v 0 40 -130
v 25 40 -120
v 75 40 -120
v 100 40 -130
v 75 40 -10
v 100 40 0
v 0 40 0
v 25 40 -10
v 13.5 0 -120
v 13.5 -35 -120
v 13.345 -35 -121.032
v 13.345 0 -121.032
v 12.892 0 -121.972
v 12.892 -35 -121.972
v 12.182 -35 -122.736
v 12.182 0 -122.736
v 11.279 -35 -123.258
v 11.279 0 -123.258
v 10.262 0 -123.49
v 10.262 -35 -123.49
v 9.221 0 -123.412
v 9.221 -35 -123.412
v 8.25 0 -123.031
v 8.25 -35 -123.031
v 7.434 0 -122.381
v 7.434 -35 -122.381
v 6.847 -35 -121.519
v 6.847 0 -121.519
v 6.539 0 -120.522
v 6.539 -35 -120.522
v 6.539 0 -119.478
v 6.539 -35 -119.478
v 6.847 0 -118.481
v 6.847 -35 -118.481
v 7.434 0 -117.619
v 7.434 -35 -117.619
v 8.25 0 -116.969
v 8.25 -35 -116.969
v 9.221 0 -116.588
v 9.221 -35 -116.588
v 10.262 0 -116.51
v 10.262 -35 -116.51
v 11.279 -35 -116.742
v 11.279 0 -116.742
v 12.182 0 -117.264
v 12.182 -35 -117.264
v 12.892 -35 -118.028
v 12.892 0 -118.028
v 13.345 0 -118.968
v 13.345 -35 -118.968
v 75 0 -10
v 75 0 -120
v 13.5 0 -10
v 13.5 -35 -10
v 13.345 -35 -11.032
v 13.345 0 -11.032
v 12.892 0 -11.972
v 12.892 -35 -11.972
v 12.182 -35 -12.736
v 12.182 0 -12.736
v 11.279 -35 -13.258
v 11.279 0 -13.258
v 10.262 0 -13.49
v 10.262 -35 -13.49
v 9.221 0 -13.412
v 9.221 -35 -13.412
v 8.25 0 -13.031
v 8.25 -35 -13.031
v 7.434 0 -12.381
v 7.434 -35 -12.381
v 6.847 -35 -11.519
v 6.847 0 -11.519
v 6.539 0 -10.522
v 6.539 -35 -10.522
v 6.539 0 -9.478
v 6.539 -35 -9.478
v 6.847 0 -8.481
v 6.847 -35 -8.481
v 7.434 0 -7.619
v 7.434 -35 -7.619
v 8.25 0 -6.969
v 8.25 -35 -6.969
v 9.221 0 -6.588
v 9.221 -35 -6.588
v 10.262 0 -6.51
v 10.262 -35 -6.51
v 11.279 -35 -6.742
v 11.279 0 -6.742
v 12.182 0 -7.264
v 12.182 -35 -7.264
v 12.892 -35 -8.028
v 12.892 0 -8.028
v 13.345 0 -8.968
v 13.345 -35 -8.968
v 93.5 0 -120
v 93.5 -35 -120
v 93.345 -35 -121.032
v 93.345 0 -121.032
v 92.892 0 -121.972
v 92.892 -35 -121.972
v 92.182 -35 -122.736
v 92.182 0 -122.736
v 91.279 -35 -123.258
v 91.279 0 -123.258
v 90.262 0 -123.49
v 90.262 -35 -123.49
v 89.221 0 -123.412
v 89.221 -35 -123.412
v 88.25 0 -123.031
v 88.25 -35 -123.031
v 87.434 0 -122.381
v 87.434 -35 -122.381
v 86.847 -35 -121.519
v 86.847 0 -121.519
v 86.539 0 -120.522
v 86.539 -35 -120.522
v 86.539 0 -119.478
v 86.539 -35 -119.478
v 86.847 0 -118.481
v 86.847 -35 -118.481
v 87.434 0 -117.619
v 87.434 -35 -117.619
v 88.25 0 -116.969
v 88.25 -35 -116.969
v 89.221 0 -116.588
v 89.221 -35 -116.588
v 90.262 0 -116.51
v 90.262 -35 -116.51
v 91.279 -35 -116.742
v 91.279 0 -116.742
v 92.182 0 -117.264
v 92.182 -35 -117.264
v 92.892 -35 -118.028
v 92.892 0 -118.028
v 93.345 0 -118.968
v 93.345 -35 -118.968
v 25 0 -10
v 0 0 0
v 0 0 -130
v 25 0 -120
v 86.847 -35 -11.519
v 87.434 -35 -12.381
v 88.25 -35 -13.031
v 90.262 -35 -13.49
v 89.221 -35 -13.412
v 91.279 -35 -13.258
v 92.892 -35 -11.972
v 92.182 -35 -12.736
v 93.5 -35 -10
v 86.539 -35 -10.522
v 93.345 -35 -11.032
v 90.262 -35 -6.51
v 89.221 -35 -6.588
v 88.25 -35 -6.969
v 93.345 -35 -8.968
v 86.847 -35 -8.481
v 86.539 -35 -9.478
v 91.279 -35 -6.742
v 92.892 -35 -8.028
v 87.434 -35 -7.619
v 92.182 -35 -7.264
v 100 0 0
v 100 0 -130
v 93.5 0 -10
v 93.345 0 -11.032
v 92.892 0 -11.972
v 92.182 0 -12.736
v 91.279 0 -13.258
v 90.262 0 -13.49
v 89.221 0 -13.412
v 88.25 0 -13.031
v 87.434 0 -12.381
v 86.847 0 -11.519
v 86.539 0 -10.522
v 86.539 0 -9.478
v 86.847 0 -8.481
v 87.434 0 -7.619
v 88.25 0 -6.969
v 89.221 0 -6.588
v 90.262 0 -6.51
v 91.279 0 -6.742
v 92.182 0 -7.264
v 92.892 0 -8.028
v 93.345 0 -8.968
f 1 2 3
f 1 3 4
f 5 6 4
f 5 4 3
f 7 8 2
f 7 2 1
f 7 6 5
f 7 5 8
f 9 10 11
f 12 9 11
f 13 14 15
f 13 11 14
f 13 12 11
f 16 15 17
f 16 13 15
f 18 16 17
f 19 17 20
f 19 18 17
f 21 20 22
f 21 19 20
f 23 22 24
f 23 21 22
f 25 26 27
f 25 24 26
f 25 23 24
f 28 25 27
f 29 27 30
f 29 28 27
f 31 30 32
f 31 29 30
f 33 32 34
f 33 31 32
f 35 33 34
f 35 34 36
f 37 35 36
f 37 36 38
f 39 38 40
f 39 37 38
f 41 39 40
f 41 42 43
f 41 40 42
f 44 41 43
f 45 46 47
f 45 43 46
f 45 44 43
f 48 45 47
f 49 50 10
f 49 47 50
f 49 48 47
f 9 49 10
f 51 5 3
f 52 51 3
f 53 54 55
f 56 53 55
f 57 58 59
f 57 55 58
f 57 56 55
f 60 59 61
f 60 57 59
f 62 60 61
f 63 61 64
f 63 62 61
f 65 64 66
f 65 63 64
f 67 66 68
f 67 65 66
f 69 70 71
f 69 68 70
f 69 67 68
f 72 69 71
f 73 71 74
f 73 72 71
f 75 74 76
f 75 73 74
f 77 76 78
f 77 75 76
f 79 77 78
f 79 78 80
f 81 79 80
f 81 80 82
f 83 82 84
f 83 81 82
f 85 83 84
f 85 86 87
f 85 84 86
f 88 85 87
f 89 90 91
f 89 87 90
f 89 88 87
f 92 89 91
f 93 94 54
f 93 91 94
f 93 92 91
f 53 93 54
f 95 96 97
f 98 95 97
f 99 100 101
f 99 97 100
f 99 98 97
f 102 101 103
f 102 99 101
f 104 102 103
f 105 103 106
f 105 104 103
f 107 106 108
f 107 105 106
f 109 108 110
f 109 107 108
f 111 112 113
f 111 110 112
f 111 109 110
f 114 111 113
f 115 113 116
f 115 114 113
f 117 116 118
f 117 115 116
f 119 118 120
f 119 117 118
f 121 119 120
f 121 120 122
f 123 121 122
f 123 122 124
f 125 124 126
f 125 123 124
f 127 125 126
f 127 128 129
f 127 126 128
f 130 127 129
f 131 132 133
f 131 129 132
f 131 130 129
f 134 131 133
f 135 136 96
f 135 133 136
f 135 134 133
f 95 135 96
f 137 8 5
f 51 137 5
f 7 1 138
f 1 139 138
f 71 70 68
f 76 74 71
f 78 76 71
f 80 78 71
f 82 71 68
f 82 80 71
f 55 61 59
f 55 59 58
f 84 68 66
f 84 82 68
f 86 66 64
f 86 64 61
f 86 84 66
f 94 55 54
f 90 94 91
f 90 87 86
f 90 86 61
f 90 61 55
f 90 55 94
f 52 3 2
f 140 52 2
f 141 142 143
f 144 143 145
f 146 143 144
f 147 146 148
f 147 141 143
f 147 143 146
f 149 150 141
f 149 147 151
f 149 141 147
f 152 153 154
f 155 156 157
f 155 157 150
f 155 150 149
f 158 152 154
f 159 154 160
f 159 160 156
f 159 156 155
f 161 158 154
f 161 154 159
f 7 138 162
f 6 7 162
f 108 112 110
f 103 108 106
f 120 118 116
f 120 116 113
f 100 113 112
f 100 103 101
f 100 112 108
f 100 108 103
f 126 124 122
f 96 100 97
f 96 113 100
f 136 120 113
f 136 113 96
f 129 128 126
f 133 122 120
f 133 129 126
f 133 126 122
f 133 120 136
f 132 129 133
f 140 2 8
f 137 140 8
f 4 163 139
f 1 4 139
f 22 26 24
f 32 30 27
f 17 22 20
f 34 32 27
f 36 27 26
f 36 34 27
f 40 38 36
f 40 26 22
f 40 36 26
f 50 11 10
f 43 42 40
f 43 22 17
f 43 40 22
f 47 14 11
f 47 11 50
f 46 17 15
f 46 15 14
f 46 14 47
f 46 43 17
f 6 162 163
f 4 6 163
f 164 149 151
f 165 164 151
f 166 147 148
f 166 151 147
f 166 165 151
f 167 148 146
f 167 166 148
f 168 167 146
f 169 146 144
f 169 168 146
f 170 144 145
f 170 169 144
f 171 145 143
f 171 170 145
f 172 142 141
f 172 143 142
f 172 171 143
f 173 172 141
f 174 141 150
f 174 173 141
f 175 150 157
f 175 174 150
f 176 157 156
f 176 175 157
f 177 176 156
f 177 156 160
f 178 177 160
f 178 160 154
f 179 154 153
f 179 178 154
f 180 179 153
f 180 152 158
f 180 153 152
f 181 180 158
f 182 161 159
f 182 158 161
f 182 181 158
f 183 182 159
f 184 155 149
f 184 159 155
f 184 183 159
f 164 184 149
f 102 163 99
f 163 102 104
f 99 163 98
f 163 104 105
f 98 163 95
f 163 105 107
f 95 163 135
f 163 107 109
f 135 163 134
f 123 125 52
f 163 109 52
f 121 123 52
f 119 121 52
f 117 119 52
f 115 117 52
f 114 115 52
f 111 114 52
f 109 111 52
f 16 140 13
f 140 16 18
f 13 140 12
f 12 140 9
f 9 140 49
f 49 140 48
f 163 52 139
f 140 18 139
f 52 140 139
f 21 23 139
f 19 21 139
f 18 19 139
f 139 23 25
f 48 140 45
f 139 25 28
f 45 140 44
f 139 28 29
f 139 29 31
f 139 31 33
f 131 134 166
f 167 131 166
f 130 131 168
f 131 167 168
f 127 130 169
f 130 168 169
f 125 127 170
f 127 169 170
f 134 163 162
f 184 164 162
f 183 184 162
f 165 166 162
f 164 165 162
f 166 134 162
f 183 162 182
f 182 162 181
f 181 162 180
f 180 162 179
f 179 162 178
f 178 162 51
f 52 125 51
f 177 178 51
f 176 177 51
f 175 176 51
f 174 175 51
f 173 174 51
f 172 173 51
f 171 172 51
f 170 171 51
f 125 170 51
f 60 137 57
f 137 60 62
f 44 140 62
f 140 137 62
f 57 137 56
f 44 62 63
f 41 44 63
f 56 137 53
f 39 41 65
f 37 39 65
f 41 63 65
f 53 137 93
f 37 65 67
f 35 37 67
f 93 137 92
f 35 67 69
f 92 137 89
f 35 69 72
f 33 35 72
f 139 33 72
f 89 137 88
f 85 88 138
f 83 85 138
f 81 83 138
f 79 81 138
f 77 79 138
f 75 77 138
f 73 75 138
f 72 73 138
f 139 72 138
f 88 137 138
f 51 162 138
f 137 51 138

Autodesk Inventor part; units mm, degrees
ref_plane "YZ Plane" through (0, 0, 0) normal (1, 0, 0) x (0, 1, 0)
ref_plane "XZ Plane" through (0, 0, 0) normal (0, 1, 0) x (-1, 0, 0)
ref_plane "XY Plane" through (0, 0, 0) normal (0, 0, 1) x (1, 0, 0)
sketch "Sketch1" plane through (0, 0, 0) normal (0, 1, 0) x (-1, 0, 0)
  line L0 (0, 0) -> (-100, 0)
  line L1 (-100, 0) -> (-100, -130)
  line L2 (-100, -130) -> (0, -130)
  line L3 (0, -130) -> (0, 0)
  dimension "d0" = 100
  dimension "d1" = 130
extrude "Extrusion1" add sketch "Sketch1" along normal blind 40
sketch "Sketch2" plane through (0, 40, 0) normal (0, 1, 0) x (1, 0, 0)
  line L0 (25, 10) -> (75, 10)
  line L1 (75, 10) -> (75, 120)
  line L2 (75, 120) -> (25, 120)
  line L3 (25, 120) -> (25, 10)
  line L4 (100, 130) -> (0, 130) projected
  line L5 (0, 0) -> (100, 0) projected
  line L6 (0, 130) -> (0, 0) projected
  line L7 (100, 0) -> (100, 130) projected
  dimension "d4" = 10
  dimension "d5" = 10
  dimension "d6" = 25
  dimension "d7" = 25
extrude "Extrusion2" cut sketch "Sketch2" against normal blind 40 contours L3 L2 L1 L0
sketch "Sketch3" plane through (0, 0, 0) normal (0, -1, 0) x (1, 0, 0)
  circle A0 centre (90, -10) radius 3.5
  line L0 (100, 0) -> (100, -130) projected
  line L1 (0, 0) -> (100, 0) projected
  line L2 (0, 0) -> (100, 0) projected
  line L3 (50, 0) -> (50, -130)
  line L4 (100, 0) -> (100, -130) projected
  line L5 (100, -65) -> (0, -65)
  line L6 (0, -130) -> (0, 0) projected
  circle A1 centre (90, -120) radius 3.5
  circle A2 centre (10, -10) radius 3.5
  line L7 (0, 0) -> (0, -130)
  line L8 (0, 0) -> (0, -130)
  circle A3 centre (10, -120) radius 3.5
  dimension "d10" = 7
  dimension "d11" = 10
  dimension "d12" = 10
extrude "Extrusion3" add sketch "Sketch3" along normal blind 35 contours A0 | A1 | A2 | A3
properties part number "top"
